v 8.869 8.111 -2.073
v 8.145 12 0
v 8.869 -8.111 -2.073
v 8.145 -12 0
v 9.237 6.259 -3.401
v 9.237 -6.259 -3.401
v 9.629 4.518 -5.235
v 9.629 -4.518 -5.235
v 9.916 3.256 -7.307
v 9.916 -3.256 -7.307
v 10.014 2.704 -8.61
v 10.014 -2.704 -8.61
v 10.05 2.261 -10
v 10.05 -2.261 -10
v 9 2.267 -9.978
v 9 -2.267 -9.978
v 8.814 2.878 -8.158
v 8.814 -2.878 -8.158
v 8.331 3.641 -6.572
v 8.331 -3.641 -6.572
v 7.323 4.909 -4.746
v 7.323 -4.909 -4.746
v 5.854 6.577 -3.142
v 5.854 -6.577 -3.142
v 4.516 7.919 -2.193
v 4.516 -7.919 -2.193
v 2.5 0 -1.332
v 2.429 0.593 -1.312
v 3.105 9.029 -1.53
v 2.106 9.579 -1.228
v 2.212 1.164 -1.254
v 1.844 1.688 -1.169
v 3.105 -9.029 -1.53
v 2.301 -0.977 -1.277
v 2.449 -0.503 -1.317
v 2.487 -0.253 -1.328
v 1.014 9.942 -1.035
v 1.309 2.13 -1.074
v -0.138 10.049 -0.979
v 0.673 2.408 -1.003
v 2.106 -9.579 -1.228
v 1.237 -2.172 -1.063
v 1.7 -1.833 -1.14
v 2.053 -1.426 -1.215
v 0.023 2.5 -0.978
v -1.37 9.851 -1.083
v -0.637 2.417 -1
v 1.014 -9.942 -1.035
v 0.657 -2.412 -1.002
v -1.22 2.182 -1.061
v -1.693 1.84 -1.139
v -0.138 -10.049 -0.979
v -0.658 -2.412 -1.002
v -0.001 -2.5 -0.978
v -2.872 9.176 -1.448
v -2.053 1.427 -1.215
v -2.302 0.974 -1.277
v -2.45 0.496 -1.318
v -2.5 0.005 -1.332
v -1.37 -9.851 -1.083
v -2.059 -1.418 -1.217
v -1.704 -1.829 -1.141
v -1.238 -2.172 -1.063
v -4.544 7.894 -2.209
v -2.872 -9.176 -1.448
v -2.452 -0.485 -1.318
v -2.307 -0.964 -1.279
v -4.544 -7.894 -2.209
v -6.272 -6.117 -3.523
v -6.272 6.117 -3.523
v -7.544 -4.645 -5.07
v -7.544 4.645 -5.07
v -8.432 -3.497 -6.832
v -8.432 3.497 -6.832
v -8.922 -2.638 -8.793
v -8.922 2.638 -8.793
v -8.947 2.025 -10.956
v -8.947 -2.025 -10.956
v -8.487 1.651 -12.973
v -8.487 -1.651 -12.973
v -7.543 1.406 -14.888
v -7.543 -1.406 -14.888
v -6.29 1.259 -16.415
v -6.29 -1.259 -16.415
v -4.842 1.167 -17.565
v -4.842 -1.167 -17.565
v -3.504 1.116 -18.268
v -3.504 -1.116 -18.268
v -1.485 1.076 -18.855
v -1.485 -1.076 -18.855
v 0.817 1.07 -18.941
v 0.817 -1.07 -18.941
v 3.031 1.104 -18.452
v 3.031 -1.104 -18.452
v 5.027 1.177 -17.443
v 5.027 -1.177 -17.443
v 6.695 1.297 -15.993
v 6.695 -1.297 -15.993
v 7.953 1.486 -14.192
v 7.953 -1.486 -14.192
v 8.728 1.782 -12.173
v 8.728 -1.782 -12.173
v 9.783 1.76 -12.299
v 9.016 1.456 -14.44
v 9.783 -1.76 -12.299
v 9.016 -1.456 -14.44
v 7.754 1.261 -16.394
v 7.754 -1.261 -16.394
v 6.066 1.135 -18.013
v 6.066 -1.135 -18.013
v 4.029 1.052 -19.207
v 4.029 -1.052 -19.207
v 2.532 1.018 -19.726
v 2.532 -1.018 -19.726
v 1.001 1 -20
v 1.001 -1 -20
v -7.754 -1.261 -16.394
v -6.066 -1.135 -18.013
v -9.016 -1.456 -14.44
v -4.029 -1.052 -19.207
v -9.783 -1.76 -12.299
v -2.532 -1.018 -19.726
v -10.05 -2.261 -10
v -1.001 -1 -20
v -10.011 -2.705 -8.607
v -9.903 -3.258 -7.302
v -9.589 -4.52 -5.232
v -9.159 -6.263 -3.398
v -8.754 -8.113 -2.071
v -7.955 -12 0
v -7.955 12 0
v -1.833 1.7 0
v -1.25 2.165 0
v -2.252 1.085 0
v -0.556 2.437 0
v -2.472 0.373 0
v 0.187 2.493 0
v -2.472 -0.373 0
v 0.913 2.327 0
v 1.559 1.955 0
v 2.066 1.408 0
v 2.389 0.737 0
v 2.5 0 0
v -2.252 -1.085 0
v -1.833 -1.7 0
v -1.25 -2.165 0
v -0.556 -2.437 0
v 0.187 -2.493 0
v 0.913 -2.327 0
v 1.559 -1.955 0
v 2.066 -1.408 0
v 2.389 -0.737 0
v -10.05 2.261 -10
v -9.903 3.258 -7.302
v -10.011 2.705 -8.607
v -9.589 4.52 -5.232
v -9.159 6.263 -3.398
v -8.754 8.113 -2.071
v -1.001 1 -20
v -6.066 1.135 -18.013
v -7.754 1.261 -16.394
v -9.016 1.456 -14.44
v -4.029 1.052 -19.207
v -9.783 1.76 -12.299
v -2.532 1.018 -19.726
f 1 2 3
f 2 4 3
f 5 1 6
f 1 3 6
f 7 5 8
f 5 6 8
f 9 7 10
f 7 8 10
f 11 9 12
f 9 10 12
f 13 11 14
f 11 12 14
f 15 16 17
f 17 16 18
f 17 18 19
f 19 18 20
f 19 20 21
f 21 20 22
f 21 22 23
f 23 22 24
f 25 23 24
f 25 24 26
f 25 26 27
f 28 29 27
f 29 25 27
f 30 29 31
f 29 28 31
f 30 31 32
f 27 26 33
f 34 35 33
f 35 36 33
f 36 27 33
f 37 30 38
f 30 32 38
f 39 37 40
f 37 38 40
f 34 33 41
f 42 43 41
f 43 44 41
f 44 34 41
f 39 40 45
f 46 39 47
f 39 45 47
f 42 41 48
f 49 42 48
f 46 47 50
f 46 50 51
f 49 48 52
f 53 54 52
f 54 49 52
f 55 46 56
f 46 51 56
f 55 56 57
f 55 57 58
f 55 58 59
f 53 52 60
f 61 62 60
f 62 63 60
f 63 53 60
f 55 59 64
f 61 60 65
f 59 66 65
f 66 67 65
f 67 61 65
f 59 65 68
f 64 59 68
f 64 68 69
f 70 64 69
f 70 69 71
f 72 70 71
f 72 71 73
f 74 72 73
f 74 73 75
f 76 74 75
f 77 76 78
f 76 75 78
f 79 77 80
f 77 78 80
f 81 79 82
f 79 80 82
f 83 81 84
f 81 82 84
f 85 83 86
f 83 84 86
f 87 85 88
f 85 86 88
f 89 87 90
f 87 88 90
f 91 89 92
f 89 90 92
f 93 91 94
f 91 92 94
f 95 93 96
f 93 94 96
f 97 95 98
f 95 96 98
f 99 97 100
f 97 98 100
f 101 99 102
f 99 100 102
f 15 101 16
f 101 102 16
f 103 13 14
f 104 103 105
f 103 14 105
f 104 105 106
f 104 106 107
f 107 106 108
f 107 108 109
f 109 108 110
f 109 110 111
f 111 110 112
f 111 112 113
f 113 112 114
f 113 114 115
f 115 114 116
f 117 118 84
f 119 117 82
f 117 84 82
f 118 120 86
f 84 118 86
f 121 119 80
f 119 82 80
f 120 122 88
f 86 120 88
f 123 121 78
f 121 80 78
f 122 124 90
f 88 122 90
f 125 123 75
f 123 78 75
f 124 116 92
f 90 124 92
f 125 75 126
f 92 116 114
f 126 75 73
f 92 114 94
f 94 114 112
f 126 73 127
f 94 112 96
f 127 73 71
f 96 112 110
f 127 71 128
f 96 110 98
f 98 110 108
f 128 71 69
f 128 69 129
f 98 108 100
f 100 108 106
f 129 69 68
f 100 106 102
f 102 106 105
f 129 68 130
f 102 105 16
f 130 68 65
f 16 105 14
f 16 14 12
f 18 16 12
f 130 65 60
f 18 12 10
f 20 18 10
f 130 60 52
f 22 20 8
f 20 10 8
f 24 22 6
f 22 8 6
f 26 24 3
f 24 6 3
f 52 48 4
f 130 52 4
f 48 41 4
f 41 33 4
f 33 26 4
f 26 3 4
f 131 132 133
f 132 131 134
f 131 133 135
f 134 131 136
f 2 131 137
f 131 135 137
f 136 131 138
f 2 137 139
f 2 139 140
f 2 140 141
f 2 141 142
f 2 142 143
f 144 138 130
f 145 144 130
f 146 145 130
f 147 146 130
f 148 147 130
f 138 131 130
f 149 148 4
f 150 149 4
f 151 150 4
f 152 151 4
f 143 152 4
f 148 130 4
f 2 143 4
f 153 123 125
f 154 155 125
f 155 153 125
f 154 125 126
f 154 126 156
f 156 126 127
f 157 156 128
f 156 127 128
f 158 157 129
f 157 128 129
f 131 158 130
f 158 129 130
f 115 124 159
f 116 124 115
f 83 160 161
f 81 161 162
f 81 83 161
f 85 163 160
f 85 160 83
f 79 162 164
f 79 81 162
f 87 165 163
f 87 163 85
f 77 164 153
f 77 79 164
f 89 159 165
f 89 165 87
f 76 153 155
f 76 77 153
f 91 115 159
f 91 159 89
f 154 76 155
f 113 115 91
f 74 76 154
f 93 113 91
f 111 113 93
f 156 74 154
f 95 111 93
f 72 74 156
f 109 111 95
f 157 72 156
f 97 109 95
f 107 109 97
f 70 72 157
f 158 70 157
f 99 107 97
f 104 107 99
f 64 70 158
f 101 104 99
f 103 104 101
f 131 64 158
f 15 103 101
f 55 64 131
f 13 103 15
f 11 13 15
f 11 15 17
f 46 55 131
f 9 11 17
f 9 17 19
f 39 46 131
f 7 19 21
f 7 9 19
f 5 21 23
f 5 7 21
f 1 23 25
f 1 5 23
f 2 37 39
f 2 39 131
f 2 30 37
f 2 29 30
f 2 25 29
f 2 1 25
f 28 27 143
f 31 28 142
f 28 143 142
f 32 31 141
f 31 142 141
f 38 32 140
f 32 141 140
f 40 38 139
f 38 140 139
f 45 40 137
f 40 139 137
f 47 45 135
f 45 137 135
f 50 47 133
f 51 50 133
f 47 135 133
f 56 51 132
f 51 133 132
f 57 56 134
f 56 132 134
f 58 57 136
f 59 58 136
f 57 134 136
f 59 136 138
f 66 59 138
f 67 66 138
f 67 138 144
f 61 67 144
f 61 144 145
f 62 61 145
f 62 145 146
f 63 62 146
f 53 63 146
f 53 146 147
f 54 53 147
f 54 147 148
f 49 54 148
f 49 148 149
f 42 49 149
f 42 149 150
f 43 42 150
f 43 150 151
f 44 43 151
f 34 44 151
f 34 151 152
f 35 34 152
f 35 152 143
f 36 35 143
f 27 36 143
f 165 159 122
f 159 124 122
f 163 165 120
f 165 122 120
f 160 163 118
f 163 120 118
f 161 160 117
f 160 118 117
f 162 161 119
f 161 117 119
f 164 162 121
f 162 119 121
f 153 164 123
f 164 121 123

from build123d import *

# Parameters (mm, degrees)
F0_W     = 22
F0_H     = 20
F1_DEPTH = 12
F3_DEPTH = 25.4
F5_DEPTH = 12.7
F6_R     = 9
F7_DEPTH = 12.7
F8_R     = 2.5
F9_DEPTH = 5


with BuildPart() as f1:
    # F0 (on Front) → F1 (new body, symmetric)
    with BuildSketch(Plane.XZ):
        with Locations((0, -10)):
            Rectangle(F0_W, F0_H)
    extrude(amount=F1_DEPTH, both=True)

    # F2 (on face) → F3 (cut)
    with BuildSketch(Plane.YZ.offset(11)):
        with BuildLine():
            add(Edge.make_bspline(
                [(-1, -20), (-1.2459891412, -16.2571385999), (-1.6894774711, -9.5092173589), (-5.4667997235, -3.2161121648), (-9.8077344698, -1.0791911379), (-12, 0)],
                knots=[0, 0, 0, 0, 0.3813816119, 0.6875843918, 1, 1, 1, 1], degree=3))
            Line((-12, 0), (-12, -20))
            Line((-12, -20), (-1, -20))
        make_face()
        with BuildLine():
            Line((12, -20), (12, 0))
            add(Edge.make_bspline(
                [(1, -20), (1.2459891412, -16.2571385999), (1.6894774711, -9.5092173589), (5.4667997235, -3.2161121648), (9.8077344698, -1.0791911379), (12, 0)],
                knots=[0, 0, 0, 0, 0.3813816119, 0.6875843918, 1, 1, 1, 1], degree=3))
            Line((1, -20), (12, -20))
        make_face()
    extrude(amount=-F3_DEPTH, mode=Mode.SUBTRACT)

    # F4 (on Front) → F5 (cut, symmetric)
    with BuildSketch(Plane.XZ):
        with BuildLine():
            Line((11.243651621, 0), (8.1397629196, 0.0138028498))
            ThreePointArc((8.1397629196, 0.0138028498), (9.568173485, -4.902813197), (10.05, -10))
            ThreePointArc((10.05, -10), (7.1064231509, -17.1064231509), (0, -20.05))
            Line((0, -20.05), (11.243651621, -20.0490429997))
            Line((11.243651621, -20.0490429997), (11.243651621, 0))
        make_face()
        with BuildLine():
            ThreePointArc((-10.05, -10), (-9.5188754702, -4.8835783868), (-7.9481515297, 0.0146549369))
            Line((-7.9481515297, 0.0146549369), (-10.05, 0.0053081137))
            Line((-10.05, 0.0053081137), (-11.243651621, 0))
            Line((-11.243651621, 0), (-11.243651621, -20.0490429997))
            Line((-11.243651621, -20.0490429997), (0, -20.05))
            ThreePointArc((0, -20.05), (-7.1064231509, -17.1064231509), (-10.05, -10))
        make_face()
    extrude(amount=F5_DEPTH, both=True, mode=Mode.SUBTRACT)

    # F6 (on Front) → F7 (cut, symmetric)
    with BuildSketch(Plane.XZ):
        with Locations((0, -9.9779)):
            Circle(F6_R)
    extrude(amount=F7_DEPTH, both=True, mode=Mode.SUBTRACT)

    # F8 (on face) → F9 (cut)
    with BuildSketch(Plane.XY):
        Circle(F8_R)
    extrude(amount=-F9_DEPTH, mode=Mode.SUBTRACT)


solid = f1.part
